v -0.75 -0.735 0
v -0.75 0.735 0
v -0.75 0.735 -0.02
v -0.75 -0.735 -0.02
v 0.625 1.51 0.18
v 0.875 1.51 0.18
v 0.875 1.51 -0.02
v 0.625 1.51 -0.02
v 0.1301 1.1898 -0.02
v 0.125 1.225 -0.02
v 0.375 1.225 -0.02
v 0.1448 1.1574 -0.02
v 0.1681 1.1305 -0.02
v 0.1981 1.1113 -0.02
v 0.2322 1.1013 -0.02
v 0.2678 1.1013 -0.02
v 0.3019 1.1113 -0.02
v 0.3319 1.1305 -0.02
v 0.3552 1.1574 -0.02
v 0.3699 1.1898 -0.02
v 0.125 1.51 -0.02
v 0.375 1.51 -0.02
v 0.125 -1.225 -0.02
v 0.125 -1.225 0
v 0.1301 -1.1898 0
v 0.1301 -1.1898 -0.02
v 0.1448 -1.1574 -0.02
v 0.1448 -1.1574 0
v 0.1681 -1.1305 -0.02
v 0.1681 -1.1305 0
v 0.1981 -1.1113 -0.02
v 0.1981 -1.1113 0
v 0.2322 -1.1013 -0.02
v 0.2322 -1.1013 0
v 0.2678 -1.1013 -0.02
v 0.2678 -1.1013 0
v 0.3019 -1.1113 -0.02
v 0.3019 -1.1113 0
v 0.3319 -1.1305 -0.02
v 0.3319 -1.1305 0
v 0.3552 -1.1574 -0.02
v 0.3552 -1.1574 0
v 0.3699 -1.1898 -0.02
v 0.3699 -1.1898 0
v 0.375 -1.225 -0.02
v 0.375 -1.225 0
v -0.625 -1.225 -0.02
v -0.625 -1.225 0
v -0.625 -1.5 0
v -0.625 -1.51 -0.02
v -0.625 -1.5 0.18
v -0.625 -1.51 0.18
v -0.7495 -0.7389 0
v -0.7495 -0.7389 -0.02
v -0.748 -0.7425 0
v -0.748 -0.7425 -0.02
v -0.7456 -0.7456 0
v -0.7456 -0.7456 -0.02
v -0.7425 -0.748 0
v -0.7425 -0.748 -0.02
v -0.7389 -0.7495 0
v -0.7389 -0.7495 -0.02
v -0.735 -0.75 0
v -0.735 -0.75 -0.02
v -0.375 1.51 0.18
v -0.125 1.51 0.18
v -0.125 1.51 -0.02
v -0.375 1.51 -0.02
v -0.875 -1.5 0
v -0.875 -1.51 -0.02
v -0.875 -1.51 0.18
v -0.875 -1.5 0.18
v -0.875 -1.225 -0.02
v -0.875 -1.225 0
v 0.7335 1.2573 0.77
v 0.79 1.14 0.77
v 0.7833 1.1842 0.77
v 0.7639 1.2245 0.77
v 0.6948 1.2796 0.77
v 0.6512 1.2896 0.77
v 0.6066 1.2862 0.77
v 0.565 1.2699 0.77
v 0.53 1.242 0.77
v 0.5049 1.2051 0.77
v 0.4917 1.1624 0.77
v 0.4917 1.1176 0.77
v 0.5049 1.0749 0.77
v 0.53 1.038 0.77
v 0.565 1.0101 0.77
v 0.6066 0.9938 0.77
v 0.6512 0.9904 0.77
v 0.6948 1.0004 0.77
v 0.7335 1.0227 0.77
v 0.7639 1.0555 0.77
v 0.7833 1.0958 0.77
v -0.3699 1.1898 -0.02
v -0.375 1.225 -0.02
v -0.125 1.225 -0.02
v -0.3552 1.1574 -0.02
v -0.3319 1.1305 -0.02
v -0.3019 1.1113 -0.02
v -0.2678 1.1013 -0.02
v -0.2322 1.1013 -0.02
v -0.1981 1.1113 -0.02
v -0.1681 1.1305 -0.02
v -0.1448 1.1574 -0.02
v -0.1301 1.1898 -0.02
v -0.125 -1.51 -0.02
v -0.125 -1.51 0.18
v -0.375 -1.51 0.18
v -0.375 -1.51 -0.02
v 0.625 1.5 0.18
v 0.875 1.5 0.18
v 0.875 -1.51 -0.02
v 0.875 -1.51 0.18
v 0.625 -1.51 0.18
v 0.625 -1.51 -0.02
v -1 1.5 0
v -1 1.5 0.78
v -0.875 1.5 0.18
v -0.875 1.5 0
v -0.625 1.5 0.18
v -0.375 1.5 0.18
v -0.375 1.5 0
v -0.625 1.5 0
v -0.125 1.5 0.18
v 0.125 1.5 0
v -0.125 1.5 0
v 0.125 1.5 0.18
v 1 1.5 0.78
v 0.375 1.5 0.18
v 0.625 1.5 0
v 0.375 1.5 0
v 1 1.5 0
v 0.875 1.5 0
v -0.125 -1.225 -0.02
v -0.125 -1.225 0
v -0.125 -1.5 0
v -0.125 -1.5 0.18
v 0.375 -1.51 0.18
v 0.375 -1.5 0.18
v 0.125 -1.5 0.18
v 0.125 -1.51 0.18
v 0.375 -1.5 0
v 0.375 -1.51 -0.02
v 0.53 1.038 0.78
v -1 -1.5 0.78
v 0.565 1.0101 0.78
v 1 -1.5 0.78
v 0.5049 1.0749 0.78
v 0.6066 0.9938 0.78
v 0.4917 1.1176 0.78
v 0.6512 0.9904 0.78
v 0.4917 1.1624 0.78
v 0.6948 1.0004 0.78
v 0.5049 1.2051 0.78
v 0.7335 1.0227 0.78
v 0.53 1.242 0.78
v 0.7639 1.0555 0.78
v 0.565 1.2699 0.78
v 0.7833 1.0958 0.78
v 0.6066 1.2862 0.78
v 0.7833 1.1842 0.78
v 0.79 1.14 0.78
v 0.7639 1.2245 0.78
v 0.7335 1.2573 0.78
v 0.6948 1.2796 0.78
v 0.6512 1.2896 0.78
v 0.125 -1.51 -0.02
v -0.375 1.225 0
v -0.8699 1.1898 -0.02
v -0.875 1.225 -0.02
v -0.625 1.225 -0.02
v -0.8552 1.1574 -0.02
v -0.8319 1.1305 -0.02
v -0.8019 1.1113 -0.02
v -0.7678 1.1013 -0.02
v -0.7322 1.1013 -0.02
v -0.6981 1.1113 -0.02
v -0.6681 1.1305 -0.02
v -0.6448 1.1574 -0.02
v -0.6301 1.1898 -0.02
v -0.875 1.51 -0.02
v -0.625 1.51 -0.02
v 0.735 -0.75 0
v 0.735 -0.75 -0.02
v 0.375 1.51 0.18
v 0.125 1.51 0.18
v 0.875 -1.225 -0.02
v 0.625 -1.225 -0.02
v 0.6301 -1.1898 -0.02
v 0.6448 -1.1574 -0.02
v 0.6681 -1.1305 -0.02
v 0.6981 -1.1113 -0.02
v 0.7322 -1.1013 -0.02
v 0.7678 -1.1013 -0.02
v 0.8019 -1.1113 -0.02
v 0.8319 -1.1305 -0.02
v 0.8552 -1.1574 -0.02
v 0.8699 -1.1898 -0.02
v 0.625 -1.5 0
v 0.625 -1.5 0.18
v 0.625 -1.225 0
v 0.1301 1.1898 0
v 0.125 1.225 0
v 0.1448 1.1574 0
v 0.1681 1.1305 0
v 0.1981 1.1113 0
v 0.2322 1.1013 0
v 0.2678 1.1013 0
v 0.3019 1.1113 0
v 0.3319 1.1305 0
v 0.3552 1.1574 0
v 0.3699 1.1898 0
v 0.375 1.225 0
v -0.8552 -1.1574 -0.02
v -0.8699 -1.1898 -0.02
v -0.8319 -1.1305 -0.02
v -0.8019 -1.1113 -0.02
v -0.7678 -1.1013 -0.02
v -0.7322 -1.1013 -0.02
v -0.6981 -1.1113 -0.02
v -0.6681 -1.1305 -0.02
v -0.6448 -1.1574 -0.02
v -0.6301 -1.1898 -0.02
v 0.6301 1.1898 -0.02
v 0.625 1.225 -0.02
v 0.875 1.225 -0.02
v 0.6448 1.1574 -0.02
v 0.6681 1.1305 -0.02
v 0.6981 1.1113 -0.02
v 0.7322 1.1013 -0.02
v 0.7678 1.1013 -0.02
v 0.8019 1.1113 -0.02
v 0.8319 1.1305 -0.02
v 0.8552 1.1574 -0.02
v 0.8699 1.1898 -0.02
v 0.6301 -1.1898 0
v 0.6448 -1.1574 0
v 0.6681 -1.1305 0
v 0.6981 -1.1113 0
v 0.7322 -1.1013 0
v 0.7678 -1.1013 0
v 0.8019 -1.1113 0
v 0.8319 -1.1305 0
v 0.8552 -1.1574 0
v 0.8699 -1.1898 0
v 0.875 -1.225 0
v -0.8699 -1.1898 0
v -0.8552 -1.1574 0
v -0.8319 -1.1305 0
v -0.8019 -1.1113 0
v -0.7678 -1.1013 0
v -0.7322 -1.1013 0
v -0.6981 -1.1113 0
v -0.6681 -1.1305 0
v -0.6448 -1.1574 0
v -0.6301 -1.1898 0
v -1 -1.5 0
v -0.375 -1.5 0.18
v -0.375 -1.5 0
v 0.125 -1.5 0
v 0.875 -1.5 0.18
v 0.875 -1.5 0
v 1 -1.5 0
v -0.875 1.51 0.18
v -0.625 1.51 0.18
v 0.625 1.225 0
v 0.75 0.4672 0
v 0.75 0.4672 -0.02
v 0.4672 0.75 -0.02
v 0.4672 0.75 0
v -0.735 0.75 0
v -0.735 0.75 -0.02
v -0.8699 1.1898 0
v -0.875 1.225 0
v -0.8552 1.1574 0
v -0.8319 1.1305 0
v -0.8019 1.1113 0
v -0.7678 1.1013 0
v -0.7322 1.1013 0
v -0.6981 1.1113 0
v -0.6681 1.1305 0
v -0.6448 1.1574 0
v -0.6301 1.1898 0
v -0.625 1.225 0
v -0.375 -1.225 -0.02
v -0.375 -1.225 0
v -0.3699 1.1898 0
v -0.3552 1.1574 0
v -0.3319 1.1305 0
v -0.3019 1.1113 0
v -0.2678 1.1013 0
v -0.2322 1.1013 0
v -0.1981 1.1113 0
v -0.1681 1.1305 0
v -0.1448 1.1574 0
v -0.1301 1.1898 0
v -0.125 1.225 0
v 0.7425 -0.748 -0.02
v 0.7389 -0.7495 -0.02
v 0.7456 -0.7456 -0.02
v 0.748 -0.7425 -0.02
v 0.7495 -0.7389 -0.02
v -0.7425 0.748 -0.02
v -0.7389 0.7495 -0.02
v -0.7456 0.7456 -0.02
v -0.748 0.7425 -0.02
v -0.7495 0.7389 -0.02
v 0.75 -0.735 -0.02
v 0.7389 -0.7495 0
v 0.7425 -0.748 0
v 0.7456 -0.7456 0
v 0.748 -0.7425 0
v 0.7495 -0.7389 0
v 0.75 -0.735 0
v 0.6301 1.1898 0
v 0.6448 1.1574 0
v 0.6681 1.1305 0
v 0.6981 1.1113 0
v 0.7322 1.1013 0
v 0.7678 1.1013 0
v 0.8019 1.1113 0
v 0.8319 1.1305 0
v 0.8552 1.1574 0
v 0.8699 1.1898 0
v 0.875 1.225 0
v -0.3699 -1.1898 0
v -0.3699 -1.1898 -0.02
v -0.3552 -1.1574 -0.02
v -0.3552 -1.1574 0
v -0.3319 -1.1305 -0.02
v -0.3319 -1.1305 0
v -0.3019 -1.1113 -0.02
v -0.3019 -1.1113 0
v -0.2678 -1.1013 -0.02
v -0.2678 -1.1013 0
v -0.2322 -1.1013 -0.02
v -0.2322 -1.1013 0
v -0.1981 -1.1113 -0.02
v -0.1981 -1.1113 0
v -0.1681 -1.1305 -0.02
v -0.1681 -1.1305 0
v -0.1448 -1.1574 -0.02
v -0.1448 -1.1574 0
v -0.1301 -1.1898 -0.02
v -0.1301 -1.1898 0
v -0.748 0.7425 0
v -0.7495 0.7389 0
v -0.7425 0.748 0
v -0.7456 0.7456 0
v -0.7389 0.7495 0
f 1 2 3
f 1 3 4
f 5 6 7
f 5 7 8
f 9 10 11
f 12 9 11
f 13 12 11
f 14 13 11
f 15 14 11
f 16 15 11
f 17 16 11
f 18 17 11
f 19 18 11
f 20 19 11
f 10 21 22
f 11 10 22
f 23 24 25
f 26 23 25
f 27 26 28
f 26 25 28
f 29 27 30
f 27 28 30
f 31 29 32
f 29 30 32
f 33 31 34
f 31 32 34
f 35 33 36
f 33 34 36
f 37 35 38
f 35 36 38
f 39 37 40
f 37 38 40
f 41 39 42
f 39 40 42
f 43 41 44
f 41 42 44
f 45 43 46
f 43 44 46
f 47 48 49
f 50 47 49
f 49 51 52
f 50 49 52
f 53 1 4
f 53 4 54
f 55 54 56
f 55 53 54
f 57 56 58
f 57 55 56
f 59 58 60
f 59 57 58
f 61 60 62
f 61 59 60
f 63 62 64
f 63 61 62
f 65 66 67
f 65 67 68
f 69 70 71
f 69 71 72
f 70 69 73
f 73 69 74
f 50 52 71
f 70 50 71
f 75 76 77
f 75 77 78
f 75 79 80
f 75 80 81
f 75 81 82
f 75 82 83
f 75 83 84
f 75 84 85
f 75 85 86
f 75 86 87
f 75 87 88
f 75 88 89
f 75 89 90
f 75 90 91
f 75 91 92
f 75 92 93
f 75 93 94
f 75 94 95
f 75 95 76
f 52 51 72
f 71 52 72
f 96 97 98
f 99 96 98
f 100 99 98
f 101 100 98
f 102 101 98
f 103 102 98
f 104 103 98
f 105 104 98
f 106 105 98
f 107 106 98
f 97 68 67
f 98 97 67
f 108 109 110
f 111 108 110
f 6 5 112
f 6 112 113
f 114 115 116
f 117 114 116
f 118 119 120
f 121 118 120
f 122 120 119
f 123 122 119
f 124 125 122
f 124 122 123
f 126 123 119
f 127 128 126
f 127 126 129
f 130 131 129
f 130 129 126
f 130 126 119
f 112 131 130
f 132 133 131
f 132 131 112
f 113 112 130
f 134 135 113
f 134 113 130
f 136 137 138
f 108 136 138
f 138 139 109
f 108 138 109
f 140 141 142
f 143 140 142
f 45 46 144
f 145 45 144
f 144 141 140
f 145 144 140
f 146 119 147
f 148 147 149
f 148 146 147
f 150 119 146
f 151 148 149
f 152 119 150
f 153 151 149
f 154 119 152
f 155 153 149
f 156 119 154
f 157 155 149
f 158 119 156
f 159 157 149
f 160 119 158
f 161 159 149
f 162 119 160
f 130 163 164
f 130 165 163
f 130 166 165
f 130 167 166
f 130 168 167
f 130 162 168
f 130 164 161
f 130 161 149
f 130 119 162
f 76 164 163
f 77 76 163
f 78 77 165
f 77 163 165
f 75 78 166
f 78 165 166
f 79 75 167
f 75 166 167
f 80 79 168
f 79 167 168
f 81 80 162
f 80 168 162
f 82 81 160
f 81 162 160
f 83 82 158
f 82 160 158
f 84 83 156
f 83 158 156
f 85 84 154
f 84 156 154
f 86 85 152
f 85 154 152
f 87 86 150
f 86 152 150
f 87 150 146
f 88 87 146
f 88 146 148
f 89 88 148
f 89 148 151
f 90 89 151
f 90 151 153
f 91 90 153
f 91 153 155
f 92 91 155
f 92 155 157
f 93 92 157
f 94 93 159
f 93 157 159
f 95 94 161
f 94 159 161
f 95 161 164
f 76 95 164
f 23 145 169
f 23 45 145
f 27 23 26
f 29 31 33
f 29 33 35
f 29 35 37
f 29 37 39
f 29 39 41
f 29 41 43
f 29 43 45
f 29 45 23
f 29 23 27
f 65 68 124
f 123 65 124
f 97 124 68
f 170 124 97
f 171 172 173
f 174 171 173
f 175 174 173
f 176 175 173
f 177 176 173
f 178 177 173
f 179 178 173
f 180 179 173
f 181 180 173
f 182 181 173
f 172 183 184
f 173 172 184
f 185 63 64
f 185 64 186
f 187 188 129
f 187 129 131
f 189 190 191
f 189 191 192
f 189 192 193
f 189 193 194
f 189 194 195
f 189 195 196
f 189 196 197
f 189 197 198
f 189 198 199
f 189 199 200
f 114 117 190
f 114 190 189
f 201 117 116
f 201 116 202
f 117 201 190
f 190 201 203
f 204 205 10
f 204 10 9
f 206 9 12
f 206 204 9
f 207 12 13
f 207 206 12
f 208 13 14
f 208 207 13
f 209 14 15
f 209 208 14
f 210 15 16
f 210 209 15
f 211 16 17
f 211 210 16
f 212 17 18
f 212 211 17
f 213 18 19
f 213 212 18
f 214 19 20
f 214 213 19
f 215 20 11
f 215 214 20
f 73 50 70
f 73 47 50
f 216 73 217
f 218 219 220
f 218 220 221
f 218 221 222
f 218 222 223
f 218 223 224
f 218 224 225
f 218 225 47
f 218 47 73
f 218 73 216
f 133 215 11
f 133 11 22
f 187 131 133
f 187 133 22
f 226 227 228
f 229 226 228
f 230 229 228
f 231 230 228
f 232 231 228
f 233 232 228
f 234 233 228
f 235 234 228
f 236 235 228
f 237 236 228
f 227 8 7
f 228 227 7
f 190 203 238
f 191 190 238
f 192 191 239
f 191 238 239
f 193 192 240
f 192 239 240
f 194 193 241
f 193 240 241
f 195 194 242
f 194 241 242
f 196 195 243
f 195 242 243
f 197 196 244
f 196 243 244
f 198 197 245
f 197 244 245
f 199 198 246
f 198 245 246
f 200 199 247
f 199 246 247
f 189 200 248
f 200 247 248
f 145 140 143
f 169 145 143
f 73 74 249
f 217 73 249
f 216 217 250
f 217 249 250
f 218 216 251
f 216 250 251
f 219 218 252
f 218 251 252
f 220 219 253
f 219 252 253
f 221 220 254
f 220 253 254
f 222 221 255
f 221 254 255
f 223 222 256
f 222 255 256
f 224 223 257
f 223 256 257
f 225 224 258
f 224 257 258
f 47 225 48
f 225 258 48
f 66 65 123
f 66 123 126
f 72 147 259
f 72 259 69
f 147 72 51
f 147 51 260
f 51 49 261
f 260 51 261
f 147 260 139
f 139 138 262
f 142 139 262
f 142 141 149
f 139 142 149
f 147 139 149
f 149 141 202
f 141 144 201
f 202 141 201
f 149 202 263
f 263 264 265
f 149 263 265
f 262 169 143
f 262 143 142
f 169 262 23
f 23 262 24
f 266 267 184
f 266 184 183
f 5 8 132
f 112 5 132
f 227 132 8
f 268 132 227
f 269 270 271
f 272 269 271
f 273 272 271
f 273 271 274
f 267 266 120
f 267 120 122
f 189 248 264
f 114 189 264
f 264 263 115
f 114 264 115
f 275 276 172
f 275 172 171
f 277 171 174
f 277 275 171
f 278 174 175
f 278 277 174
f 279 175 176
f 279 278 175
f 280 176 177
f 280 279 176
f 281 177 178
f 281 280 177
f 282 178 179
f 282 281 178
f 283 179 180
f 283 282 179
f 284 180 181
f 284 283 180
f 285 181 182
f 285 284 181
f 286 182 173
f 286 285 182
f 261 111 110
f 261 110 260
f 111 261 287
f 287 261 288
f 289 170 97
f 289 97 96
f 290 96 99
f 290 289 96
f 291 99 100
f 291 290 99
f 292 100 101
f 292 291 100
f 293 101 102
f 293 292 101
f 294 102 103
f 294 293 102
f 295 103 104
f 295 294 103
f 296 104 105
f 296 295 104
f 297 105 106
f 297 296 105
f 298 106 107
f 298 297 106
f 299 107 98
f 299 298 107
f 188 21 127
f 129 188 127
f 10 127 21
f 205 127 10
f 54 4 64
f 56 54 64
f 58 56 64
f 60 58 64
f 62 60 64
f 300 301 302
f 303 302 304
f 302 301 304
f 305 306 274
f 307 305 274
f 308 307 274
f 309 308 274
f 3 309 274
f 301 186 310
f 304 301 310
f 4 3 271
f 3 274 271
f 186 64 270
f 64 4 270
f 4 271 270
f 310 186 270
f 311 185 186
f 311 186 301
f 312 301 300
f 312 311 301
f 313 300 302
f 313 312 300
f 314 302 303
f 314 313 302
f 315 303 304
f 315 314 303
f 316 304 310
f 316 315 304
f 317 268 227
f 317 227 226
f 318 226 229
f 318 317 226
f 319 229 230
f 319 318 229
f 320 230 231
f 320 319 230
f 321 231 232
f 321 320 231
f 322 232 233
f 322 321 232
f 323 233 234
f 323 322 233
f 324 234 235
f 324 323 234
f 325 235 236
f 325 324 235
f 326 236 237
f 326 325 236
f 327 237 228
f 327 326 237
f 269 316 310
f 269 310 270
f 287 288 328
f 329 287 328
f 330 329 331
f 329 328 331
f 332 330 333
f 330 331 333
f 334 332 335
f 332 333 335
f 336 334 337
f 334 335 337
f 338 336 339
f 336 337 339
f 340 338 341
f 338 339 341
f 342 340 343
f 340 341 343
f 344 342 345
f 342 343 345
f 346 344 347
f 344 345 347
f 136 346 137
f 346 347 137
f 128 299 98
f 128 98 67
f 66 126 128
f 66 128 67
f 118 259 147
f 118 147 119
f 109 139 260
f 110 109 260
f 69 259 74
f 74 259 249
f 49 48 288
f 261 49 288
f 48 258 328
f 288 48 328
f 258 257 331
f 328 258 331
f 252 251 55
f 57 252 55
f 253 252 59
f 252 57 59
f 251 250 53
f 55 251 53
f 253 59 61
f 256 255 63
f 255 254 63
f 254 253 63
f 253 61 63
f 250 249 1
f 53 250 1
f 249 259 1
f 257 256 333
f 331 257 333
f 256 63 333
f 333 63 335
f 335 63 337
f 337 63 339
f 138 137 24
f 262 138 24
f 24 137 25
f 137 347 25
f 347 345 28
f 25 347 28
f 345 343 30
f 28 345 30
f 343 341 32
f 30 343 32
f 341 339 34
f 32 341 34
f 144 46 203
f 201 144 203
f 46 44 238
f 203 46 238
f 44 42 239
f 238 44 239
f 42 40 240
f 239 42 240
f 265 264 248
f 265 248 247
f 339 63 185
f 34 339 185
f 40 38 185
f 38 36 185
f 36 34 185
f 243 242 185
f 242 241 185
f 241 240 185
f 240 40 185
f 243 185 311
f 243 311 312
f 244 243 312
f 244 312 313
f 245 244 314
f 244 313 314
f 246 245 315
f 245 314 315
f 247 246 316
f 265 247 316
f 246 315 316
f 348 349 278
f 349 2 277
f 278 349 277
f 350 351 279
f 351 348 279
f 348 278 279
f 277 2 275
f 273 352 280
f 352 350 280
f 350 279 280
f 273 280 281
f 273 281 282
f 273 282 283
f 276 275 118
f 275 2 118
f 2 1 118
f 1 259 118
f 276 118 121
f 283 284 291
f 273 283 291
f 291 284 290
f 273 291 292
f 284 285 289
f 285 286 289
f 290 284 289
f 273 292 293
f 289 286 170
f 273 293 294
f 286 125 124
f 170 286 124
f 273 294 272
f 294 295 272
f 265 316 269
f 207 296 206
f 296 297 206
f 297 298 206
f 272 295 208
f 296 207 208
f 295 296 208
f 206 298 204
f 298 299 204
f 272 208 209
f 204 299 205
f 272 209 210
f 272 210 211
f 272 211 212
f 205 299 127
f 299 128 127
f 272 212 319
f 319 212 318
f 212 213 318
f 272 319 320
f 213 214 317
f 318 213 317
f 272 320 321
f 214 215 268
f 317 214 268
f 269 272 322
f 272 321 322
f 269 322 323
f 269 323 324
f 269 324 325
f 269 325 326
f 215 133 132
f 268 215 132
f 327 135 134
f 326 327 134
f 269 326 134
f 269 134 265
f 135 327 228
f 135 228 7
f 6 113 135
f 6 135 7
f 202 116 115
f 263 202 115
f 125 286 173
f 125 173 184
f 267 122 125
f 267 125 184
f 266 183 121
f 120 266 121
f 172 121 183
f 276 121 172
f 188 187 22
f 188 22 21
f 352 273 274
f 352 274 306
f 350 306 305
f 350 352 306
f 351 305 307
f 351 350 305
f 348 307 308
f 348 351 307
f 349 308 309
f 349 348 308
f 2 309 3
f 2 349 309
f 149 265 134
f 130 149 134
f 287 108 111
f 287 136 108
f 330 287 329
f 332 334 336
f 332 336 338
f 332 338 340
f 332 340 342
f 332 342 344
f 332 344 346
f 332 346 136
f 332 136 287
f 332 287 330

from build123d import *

# Parameters (mm, degrees)
SKETCH1_W            = 2
SKETCH1_H            = 3
BOSS_EXTRUDE1_DEPTH  = 0.78
SKETCH2_R            = 0.15
CUT_EXTRUDE1_DEPTH   = 0.01
BOSS_EXTRUDE2_DEPTH  = 0.02
BOSS_EXTRUDE4_START  = -0.18
BOSS_EXTRUDE4_DEPTH  = 0.2
LPATTERN2_COUNT      = 4
LPATTERN2_PITCH      = 0.5
MIRROR2_START        = -0.18
MIRROR2_COPY_1_DEPTH = 0.2
MIRROR2_COPY_2_DEPTH = 0.2
MIRROR2_COPY_3_DEPTH = 0.2
CUT_EXTRUDE2_DEPTH   = 0.02


with BuildPart() as part:
    # Sketch1 → Boss-Extrude1 (new body)
    with BuildSketch(Plane.XY):
        Rectangle(SKETCH1_W, SKETCH1_H)
    extrude(amount=BOSS_EXTRUDE1_DEPTH)

    # Sketch2 → Cut-Extrude1 (cut)
    with BuildSketch(Plane.XY.offset(0.78)):
        with Locations((0.64, 1.14)):
            Circle(SKETCH2_R)
    extrude(amount=-CUT_EXTRUDE1_DEPTH, mode=Mode.SUBTRACT)

    # Sketch3 → Boss-Extrude2 (add)
    with BuildSketch(Plane(origin=(0, 0, 0), x_dir=(-1, 0, 0), z_dir=(0, 0, -1))):
        with BuildLine():
            Line((0.735, -0.75), (-0.735, -0.75))
            ThreePointArc((-0.735, -0.75), (-0.745606602, -0.745606602), (-0.75, -0.735))
            Line((-0.75, -0.735), (-0.75, 0.735))
            ThreePointArc((-0.75, 0.735), (-0.745606602, 0.745606602), (-0.735, 0.75))
            Line((-0.735, 0.75), (0.735, 0.75))
            ThreePointArc((0.735, 0.75), (0.745606602, 0.745606602), (0.75, 0.735))
            Line((0.75, 0.735), (0.75, -0.735))
            ThreePointArc((0.75, -0.735), (0.745606602, -0.745606602), (0.735, -0.75))
        make_face()
    extrude(amount=BOSS_EXTRUDE2_DEPTH)

    # Sketch6 → Boss-Extrude4 (add)
    with BuildSketch(Plane(origin=(0, 0, 0), x_dir=(-1, 0, 0), z_dir=(0, 0, -1)).offset(BOSS_EXTRUDE4_START)):
        with BuildLine():
            Line((-0.875, 1.51), (-0.625, 1.51))
            Line((-0.625, 1.51), (-0.625, 1.5))
            Line((-0.625, 1.5), (-0.625, 1.225))
            ThreePointArc((-0.625, 1.225), (-0.75, 1.1), (-0.875, 1.225))
            Line((-0.875, 1.225), (-0.875, 1.5))
            Line((-0.875, 1.5), (-0.875, 1.51))
        make_face()
    boss_extrude4 = extrude(amount=BOSS_EXTRUDE4_DEPTH)

    # LPattern2: Boss-Extrude4 ×4
    with Locations(*[(-i * LPATTERN2_PITCH, 0, 0) for i in range(1, LPATTERN2_COUNT)]):
        add(boss_extrude4)

    # Mirror2: Boss-Extrude4 across plane
    add(boss_extrude4.mirror(Plane.ZX))

    # Mirror2 copy 1 sketch → Mirror2 copy 1 (add)
    with BuildSketch(Plane(origin=(-0.5, 0, 0), x_dir=(-1, 0, 0), z_dir=(0, 0, -1)).offset(MIRROR2_START)):
        with BuildLine():
            Line((-0.875, -1.51), (-0.625, -1.51))
            Line((-0.625, -1.51), (-0.625, -1.5))
            Line((-0.625, -1.5), (-0.625, -1.225))
            ThreePointArc((-0.625, -1.225), (-0.75, -1.1), (-0.875, -1.225))
            Line((-0.875, -1.225), (-0.875, -1.5))
            Line((-0.875, -1.5), (-0.875, -1.51))
        make_face()
    extrude(amount=MIRROR2_COPY_1_DEPTH)

    # Mirror2 copy 2 sketch → Mirror2 copy 2 (add)
    with BuildSketch(Plane(origin=(-1, 0, 0), x_dir=(-1, 0, 0), z_dir=(0, 0, -1)).offset(MIRROR2_START)):
        with BuildLine():
            Line((-0.875, -1.51), (-0.625, -1.51))
            Line((-0.625, -1.51), (-0.625, -1.5))
            Line((-0.625, -1.5), (-0.625, -1.225))
            ThreePointArc((-0.625, -1.225), (-0.75, -1.1), (-0.875, -1.225))
            Line((-0.875, -1.225), (-0.875, -1.5))
            Line((-0.875, -1.5), (-0.875, -1.51))
        make_face()
    extrude(amount=MIRROR2_COPY_2_DEPTH)

    # Mirror2 copy 3 sketch → Mirror2 copy 3 (add)
    with BuildSketch(Plane(origin=(-1.5, 0, 0), x_dir=(-1, 0, 0), z_dir=(0, 0, -1)).offset(MIRROR2_START)):
        with BuildLine():
            Line((-0.875, -1.51), (-0.625, -1.51))
            Line((-0.625, -1.51), (-0.625, -1.5))
            Line((-0.625, -1.5), (-0.625, -1.225))
            ThreePointArc((-0.625, -1.225), (-0.75, -1.1), (-0.875, -1.225))
            Line((-0.875, -1.225), (-0.875, -1.5))
            Line((-0.875, -1.5), (-0.875, -1.51))
        make_face()
    extrude(amount=MIRROR2_COPY_3_DEPTH)

    # Sketch7 → Cut-Extrude2 (cut)
    with BuildSketch(Plane(origin=(0, 0, -0.02), x_dir=(-1, 0, 0), z_dir=(0, 0, -1))):
        Polygon((-0.75, 0.467157288), (-0.467157288, 0.75), (-0.75, 0.75), align=None)
    extrude(amount=-CUT_EXTRUDE2_DEPTH, mode=Mode.SUBTRACT)


solid = part.part
